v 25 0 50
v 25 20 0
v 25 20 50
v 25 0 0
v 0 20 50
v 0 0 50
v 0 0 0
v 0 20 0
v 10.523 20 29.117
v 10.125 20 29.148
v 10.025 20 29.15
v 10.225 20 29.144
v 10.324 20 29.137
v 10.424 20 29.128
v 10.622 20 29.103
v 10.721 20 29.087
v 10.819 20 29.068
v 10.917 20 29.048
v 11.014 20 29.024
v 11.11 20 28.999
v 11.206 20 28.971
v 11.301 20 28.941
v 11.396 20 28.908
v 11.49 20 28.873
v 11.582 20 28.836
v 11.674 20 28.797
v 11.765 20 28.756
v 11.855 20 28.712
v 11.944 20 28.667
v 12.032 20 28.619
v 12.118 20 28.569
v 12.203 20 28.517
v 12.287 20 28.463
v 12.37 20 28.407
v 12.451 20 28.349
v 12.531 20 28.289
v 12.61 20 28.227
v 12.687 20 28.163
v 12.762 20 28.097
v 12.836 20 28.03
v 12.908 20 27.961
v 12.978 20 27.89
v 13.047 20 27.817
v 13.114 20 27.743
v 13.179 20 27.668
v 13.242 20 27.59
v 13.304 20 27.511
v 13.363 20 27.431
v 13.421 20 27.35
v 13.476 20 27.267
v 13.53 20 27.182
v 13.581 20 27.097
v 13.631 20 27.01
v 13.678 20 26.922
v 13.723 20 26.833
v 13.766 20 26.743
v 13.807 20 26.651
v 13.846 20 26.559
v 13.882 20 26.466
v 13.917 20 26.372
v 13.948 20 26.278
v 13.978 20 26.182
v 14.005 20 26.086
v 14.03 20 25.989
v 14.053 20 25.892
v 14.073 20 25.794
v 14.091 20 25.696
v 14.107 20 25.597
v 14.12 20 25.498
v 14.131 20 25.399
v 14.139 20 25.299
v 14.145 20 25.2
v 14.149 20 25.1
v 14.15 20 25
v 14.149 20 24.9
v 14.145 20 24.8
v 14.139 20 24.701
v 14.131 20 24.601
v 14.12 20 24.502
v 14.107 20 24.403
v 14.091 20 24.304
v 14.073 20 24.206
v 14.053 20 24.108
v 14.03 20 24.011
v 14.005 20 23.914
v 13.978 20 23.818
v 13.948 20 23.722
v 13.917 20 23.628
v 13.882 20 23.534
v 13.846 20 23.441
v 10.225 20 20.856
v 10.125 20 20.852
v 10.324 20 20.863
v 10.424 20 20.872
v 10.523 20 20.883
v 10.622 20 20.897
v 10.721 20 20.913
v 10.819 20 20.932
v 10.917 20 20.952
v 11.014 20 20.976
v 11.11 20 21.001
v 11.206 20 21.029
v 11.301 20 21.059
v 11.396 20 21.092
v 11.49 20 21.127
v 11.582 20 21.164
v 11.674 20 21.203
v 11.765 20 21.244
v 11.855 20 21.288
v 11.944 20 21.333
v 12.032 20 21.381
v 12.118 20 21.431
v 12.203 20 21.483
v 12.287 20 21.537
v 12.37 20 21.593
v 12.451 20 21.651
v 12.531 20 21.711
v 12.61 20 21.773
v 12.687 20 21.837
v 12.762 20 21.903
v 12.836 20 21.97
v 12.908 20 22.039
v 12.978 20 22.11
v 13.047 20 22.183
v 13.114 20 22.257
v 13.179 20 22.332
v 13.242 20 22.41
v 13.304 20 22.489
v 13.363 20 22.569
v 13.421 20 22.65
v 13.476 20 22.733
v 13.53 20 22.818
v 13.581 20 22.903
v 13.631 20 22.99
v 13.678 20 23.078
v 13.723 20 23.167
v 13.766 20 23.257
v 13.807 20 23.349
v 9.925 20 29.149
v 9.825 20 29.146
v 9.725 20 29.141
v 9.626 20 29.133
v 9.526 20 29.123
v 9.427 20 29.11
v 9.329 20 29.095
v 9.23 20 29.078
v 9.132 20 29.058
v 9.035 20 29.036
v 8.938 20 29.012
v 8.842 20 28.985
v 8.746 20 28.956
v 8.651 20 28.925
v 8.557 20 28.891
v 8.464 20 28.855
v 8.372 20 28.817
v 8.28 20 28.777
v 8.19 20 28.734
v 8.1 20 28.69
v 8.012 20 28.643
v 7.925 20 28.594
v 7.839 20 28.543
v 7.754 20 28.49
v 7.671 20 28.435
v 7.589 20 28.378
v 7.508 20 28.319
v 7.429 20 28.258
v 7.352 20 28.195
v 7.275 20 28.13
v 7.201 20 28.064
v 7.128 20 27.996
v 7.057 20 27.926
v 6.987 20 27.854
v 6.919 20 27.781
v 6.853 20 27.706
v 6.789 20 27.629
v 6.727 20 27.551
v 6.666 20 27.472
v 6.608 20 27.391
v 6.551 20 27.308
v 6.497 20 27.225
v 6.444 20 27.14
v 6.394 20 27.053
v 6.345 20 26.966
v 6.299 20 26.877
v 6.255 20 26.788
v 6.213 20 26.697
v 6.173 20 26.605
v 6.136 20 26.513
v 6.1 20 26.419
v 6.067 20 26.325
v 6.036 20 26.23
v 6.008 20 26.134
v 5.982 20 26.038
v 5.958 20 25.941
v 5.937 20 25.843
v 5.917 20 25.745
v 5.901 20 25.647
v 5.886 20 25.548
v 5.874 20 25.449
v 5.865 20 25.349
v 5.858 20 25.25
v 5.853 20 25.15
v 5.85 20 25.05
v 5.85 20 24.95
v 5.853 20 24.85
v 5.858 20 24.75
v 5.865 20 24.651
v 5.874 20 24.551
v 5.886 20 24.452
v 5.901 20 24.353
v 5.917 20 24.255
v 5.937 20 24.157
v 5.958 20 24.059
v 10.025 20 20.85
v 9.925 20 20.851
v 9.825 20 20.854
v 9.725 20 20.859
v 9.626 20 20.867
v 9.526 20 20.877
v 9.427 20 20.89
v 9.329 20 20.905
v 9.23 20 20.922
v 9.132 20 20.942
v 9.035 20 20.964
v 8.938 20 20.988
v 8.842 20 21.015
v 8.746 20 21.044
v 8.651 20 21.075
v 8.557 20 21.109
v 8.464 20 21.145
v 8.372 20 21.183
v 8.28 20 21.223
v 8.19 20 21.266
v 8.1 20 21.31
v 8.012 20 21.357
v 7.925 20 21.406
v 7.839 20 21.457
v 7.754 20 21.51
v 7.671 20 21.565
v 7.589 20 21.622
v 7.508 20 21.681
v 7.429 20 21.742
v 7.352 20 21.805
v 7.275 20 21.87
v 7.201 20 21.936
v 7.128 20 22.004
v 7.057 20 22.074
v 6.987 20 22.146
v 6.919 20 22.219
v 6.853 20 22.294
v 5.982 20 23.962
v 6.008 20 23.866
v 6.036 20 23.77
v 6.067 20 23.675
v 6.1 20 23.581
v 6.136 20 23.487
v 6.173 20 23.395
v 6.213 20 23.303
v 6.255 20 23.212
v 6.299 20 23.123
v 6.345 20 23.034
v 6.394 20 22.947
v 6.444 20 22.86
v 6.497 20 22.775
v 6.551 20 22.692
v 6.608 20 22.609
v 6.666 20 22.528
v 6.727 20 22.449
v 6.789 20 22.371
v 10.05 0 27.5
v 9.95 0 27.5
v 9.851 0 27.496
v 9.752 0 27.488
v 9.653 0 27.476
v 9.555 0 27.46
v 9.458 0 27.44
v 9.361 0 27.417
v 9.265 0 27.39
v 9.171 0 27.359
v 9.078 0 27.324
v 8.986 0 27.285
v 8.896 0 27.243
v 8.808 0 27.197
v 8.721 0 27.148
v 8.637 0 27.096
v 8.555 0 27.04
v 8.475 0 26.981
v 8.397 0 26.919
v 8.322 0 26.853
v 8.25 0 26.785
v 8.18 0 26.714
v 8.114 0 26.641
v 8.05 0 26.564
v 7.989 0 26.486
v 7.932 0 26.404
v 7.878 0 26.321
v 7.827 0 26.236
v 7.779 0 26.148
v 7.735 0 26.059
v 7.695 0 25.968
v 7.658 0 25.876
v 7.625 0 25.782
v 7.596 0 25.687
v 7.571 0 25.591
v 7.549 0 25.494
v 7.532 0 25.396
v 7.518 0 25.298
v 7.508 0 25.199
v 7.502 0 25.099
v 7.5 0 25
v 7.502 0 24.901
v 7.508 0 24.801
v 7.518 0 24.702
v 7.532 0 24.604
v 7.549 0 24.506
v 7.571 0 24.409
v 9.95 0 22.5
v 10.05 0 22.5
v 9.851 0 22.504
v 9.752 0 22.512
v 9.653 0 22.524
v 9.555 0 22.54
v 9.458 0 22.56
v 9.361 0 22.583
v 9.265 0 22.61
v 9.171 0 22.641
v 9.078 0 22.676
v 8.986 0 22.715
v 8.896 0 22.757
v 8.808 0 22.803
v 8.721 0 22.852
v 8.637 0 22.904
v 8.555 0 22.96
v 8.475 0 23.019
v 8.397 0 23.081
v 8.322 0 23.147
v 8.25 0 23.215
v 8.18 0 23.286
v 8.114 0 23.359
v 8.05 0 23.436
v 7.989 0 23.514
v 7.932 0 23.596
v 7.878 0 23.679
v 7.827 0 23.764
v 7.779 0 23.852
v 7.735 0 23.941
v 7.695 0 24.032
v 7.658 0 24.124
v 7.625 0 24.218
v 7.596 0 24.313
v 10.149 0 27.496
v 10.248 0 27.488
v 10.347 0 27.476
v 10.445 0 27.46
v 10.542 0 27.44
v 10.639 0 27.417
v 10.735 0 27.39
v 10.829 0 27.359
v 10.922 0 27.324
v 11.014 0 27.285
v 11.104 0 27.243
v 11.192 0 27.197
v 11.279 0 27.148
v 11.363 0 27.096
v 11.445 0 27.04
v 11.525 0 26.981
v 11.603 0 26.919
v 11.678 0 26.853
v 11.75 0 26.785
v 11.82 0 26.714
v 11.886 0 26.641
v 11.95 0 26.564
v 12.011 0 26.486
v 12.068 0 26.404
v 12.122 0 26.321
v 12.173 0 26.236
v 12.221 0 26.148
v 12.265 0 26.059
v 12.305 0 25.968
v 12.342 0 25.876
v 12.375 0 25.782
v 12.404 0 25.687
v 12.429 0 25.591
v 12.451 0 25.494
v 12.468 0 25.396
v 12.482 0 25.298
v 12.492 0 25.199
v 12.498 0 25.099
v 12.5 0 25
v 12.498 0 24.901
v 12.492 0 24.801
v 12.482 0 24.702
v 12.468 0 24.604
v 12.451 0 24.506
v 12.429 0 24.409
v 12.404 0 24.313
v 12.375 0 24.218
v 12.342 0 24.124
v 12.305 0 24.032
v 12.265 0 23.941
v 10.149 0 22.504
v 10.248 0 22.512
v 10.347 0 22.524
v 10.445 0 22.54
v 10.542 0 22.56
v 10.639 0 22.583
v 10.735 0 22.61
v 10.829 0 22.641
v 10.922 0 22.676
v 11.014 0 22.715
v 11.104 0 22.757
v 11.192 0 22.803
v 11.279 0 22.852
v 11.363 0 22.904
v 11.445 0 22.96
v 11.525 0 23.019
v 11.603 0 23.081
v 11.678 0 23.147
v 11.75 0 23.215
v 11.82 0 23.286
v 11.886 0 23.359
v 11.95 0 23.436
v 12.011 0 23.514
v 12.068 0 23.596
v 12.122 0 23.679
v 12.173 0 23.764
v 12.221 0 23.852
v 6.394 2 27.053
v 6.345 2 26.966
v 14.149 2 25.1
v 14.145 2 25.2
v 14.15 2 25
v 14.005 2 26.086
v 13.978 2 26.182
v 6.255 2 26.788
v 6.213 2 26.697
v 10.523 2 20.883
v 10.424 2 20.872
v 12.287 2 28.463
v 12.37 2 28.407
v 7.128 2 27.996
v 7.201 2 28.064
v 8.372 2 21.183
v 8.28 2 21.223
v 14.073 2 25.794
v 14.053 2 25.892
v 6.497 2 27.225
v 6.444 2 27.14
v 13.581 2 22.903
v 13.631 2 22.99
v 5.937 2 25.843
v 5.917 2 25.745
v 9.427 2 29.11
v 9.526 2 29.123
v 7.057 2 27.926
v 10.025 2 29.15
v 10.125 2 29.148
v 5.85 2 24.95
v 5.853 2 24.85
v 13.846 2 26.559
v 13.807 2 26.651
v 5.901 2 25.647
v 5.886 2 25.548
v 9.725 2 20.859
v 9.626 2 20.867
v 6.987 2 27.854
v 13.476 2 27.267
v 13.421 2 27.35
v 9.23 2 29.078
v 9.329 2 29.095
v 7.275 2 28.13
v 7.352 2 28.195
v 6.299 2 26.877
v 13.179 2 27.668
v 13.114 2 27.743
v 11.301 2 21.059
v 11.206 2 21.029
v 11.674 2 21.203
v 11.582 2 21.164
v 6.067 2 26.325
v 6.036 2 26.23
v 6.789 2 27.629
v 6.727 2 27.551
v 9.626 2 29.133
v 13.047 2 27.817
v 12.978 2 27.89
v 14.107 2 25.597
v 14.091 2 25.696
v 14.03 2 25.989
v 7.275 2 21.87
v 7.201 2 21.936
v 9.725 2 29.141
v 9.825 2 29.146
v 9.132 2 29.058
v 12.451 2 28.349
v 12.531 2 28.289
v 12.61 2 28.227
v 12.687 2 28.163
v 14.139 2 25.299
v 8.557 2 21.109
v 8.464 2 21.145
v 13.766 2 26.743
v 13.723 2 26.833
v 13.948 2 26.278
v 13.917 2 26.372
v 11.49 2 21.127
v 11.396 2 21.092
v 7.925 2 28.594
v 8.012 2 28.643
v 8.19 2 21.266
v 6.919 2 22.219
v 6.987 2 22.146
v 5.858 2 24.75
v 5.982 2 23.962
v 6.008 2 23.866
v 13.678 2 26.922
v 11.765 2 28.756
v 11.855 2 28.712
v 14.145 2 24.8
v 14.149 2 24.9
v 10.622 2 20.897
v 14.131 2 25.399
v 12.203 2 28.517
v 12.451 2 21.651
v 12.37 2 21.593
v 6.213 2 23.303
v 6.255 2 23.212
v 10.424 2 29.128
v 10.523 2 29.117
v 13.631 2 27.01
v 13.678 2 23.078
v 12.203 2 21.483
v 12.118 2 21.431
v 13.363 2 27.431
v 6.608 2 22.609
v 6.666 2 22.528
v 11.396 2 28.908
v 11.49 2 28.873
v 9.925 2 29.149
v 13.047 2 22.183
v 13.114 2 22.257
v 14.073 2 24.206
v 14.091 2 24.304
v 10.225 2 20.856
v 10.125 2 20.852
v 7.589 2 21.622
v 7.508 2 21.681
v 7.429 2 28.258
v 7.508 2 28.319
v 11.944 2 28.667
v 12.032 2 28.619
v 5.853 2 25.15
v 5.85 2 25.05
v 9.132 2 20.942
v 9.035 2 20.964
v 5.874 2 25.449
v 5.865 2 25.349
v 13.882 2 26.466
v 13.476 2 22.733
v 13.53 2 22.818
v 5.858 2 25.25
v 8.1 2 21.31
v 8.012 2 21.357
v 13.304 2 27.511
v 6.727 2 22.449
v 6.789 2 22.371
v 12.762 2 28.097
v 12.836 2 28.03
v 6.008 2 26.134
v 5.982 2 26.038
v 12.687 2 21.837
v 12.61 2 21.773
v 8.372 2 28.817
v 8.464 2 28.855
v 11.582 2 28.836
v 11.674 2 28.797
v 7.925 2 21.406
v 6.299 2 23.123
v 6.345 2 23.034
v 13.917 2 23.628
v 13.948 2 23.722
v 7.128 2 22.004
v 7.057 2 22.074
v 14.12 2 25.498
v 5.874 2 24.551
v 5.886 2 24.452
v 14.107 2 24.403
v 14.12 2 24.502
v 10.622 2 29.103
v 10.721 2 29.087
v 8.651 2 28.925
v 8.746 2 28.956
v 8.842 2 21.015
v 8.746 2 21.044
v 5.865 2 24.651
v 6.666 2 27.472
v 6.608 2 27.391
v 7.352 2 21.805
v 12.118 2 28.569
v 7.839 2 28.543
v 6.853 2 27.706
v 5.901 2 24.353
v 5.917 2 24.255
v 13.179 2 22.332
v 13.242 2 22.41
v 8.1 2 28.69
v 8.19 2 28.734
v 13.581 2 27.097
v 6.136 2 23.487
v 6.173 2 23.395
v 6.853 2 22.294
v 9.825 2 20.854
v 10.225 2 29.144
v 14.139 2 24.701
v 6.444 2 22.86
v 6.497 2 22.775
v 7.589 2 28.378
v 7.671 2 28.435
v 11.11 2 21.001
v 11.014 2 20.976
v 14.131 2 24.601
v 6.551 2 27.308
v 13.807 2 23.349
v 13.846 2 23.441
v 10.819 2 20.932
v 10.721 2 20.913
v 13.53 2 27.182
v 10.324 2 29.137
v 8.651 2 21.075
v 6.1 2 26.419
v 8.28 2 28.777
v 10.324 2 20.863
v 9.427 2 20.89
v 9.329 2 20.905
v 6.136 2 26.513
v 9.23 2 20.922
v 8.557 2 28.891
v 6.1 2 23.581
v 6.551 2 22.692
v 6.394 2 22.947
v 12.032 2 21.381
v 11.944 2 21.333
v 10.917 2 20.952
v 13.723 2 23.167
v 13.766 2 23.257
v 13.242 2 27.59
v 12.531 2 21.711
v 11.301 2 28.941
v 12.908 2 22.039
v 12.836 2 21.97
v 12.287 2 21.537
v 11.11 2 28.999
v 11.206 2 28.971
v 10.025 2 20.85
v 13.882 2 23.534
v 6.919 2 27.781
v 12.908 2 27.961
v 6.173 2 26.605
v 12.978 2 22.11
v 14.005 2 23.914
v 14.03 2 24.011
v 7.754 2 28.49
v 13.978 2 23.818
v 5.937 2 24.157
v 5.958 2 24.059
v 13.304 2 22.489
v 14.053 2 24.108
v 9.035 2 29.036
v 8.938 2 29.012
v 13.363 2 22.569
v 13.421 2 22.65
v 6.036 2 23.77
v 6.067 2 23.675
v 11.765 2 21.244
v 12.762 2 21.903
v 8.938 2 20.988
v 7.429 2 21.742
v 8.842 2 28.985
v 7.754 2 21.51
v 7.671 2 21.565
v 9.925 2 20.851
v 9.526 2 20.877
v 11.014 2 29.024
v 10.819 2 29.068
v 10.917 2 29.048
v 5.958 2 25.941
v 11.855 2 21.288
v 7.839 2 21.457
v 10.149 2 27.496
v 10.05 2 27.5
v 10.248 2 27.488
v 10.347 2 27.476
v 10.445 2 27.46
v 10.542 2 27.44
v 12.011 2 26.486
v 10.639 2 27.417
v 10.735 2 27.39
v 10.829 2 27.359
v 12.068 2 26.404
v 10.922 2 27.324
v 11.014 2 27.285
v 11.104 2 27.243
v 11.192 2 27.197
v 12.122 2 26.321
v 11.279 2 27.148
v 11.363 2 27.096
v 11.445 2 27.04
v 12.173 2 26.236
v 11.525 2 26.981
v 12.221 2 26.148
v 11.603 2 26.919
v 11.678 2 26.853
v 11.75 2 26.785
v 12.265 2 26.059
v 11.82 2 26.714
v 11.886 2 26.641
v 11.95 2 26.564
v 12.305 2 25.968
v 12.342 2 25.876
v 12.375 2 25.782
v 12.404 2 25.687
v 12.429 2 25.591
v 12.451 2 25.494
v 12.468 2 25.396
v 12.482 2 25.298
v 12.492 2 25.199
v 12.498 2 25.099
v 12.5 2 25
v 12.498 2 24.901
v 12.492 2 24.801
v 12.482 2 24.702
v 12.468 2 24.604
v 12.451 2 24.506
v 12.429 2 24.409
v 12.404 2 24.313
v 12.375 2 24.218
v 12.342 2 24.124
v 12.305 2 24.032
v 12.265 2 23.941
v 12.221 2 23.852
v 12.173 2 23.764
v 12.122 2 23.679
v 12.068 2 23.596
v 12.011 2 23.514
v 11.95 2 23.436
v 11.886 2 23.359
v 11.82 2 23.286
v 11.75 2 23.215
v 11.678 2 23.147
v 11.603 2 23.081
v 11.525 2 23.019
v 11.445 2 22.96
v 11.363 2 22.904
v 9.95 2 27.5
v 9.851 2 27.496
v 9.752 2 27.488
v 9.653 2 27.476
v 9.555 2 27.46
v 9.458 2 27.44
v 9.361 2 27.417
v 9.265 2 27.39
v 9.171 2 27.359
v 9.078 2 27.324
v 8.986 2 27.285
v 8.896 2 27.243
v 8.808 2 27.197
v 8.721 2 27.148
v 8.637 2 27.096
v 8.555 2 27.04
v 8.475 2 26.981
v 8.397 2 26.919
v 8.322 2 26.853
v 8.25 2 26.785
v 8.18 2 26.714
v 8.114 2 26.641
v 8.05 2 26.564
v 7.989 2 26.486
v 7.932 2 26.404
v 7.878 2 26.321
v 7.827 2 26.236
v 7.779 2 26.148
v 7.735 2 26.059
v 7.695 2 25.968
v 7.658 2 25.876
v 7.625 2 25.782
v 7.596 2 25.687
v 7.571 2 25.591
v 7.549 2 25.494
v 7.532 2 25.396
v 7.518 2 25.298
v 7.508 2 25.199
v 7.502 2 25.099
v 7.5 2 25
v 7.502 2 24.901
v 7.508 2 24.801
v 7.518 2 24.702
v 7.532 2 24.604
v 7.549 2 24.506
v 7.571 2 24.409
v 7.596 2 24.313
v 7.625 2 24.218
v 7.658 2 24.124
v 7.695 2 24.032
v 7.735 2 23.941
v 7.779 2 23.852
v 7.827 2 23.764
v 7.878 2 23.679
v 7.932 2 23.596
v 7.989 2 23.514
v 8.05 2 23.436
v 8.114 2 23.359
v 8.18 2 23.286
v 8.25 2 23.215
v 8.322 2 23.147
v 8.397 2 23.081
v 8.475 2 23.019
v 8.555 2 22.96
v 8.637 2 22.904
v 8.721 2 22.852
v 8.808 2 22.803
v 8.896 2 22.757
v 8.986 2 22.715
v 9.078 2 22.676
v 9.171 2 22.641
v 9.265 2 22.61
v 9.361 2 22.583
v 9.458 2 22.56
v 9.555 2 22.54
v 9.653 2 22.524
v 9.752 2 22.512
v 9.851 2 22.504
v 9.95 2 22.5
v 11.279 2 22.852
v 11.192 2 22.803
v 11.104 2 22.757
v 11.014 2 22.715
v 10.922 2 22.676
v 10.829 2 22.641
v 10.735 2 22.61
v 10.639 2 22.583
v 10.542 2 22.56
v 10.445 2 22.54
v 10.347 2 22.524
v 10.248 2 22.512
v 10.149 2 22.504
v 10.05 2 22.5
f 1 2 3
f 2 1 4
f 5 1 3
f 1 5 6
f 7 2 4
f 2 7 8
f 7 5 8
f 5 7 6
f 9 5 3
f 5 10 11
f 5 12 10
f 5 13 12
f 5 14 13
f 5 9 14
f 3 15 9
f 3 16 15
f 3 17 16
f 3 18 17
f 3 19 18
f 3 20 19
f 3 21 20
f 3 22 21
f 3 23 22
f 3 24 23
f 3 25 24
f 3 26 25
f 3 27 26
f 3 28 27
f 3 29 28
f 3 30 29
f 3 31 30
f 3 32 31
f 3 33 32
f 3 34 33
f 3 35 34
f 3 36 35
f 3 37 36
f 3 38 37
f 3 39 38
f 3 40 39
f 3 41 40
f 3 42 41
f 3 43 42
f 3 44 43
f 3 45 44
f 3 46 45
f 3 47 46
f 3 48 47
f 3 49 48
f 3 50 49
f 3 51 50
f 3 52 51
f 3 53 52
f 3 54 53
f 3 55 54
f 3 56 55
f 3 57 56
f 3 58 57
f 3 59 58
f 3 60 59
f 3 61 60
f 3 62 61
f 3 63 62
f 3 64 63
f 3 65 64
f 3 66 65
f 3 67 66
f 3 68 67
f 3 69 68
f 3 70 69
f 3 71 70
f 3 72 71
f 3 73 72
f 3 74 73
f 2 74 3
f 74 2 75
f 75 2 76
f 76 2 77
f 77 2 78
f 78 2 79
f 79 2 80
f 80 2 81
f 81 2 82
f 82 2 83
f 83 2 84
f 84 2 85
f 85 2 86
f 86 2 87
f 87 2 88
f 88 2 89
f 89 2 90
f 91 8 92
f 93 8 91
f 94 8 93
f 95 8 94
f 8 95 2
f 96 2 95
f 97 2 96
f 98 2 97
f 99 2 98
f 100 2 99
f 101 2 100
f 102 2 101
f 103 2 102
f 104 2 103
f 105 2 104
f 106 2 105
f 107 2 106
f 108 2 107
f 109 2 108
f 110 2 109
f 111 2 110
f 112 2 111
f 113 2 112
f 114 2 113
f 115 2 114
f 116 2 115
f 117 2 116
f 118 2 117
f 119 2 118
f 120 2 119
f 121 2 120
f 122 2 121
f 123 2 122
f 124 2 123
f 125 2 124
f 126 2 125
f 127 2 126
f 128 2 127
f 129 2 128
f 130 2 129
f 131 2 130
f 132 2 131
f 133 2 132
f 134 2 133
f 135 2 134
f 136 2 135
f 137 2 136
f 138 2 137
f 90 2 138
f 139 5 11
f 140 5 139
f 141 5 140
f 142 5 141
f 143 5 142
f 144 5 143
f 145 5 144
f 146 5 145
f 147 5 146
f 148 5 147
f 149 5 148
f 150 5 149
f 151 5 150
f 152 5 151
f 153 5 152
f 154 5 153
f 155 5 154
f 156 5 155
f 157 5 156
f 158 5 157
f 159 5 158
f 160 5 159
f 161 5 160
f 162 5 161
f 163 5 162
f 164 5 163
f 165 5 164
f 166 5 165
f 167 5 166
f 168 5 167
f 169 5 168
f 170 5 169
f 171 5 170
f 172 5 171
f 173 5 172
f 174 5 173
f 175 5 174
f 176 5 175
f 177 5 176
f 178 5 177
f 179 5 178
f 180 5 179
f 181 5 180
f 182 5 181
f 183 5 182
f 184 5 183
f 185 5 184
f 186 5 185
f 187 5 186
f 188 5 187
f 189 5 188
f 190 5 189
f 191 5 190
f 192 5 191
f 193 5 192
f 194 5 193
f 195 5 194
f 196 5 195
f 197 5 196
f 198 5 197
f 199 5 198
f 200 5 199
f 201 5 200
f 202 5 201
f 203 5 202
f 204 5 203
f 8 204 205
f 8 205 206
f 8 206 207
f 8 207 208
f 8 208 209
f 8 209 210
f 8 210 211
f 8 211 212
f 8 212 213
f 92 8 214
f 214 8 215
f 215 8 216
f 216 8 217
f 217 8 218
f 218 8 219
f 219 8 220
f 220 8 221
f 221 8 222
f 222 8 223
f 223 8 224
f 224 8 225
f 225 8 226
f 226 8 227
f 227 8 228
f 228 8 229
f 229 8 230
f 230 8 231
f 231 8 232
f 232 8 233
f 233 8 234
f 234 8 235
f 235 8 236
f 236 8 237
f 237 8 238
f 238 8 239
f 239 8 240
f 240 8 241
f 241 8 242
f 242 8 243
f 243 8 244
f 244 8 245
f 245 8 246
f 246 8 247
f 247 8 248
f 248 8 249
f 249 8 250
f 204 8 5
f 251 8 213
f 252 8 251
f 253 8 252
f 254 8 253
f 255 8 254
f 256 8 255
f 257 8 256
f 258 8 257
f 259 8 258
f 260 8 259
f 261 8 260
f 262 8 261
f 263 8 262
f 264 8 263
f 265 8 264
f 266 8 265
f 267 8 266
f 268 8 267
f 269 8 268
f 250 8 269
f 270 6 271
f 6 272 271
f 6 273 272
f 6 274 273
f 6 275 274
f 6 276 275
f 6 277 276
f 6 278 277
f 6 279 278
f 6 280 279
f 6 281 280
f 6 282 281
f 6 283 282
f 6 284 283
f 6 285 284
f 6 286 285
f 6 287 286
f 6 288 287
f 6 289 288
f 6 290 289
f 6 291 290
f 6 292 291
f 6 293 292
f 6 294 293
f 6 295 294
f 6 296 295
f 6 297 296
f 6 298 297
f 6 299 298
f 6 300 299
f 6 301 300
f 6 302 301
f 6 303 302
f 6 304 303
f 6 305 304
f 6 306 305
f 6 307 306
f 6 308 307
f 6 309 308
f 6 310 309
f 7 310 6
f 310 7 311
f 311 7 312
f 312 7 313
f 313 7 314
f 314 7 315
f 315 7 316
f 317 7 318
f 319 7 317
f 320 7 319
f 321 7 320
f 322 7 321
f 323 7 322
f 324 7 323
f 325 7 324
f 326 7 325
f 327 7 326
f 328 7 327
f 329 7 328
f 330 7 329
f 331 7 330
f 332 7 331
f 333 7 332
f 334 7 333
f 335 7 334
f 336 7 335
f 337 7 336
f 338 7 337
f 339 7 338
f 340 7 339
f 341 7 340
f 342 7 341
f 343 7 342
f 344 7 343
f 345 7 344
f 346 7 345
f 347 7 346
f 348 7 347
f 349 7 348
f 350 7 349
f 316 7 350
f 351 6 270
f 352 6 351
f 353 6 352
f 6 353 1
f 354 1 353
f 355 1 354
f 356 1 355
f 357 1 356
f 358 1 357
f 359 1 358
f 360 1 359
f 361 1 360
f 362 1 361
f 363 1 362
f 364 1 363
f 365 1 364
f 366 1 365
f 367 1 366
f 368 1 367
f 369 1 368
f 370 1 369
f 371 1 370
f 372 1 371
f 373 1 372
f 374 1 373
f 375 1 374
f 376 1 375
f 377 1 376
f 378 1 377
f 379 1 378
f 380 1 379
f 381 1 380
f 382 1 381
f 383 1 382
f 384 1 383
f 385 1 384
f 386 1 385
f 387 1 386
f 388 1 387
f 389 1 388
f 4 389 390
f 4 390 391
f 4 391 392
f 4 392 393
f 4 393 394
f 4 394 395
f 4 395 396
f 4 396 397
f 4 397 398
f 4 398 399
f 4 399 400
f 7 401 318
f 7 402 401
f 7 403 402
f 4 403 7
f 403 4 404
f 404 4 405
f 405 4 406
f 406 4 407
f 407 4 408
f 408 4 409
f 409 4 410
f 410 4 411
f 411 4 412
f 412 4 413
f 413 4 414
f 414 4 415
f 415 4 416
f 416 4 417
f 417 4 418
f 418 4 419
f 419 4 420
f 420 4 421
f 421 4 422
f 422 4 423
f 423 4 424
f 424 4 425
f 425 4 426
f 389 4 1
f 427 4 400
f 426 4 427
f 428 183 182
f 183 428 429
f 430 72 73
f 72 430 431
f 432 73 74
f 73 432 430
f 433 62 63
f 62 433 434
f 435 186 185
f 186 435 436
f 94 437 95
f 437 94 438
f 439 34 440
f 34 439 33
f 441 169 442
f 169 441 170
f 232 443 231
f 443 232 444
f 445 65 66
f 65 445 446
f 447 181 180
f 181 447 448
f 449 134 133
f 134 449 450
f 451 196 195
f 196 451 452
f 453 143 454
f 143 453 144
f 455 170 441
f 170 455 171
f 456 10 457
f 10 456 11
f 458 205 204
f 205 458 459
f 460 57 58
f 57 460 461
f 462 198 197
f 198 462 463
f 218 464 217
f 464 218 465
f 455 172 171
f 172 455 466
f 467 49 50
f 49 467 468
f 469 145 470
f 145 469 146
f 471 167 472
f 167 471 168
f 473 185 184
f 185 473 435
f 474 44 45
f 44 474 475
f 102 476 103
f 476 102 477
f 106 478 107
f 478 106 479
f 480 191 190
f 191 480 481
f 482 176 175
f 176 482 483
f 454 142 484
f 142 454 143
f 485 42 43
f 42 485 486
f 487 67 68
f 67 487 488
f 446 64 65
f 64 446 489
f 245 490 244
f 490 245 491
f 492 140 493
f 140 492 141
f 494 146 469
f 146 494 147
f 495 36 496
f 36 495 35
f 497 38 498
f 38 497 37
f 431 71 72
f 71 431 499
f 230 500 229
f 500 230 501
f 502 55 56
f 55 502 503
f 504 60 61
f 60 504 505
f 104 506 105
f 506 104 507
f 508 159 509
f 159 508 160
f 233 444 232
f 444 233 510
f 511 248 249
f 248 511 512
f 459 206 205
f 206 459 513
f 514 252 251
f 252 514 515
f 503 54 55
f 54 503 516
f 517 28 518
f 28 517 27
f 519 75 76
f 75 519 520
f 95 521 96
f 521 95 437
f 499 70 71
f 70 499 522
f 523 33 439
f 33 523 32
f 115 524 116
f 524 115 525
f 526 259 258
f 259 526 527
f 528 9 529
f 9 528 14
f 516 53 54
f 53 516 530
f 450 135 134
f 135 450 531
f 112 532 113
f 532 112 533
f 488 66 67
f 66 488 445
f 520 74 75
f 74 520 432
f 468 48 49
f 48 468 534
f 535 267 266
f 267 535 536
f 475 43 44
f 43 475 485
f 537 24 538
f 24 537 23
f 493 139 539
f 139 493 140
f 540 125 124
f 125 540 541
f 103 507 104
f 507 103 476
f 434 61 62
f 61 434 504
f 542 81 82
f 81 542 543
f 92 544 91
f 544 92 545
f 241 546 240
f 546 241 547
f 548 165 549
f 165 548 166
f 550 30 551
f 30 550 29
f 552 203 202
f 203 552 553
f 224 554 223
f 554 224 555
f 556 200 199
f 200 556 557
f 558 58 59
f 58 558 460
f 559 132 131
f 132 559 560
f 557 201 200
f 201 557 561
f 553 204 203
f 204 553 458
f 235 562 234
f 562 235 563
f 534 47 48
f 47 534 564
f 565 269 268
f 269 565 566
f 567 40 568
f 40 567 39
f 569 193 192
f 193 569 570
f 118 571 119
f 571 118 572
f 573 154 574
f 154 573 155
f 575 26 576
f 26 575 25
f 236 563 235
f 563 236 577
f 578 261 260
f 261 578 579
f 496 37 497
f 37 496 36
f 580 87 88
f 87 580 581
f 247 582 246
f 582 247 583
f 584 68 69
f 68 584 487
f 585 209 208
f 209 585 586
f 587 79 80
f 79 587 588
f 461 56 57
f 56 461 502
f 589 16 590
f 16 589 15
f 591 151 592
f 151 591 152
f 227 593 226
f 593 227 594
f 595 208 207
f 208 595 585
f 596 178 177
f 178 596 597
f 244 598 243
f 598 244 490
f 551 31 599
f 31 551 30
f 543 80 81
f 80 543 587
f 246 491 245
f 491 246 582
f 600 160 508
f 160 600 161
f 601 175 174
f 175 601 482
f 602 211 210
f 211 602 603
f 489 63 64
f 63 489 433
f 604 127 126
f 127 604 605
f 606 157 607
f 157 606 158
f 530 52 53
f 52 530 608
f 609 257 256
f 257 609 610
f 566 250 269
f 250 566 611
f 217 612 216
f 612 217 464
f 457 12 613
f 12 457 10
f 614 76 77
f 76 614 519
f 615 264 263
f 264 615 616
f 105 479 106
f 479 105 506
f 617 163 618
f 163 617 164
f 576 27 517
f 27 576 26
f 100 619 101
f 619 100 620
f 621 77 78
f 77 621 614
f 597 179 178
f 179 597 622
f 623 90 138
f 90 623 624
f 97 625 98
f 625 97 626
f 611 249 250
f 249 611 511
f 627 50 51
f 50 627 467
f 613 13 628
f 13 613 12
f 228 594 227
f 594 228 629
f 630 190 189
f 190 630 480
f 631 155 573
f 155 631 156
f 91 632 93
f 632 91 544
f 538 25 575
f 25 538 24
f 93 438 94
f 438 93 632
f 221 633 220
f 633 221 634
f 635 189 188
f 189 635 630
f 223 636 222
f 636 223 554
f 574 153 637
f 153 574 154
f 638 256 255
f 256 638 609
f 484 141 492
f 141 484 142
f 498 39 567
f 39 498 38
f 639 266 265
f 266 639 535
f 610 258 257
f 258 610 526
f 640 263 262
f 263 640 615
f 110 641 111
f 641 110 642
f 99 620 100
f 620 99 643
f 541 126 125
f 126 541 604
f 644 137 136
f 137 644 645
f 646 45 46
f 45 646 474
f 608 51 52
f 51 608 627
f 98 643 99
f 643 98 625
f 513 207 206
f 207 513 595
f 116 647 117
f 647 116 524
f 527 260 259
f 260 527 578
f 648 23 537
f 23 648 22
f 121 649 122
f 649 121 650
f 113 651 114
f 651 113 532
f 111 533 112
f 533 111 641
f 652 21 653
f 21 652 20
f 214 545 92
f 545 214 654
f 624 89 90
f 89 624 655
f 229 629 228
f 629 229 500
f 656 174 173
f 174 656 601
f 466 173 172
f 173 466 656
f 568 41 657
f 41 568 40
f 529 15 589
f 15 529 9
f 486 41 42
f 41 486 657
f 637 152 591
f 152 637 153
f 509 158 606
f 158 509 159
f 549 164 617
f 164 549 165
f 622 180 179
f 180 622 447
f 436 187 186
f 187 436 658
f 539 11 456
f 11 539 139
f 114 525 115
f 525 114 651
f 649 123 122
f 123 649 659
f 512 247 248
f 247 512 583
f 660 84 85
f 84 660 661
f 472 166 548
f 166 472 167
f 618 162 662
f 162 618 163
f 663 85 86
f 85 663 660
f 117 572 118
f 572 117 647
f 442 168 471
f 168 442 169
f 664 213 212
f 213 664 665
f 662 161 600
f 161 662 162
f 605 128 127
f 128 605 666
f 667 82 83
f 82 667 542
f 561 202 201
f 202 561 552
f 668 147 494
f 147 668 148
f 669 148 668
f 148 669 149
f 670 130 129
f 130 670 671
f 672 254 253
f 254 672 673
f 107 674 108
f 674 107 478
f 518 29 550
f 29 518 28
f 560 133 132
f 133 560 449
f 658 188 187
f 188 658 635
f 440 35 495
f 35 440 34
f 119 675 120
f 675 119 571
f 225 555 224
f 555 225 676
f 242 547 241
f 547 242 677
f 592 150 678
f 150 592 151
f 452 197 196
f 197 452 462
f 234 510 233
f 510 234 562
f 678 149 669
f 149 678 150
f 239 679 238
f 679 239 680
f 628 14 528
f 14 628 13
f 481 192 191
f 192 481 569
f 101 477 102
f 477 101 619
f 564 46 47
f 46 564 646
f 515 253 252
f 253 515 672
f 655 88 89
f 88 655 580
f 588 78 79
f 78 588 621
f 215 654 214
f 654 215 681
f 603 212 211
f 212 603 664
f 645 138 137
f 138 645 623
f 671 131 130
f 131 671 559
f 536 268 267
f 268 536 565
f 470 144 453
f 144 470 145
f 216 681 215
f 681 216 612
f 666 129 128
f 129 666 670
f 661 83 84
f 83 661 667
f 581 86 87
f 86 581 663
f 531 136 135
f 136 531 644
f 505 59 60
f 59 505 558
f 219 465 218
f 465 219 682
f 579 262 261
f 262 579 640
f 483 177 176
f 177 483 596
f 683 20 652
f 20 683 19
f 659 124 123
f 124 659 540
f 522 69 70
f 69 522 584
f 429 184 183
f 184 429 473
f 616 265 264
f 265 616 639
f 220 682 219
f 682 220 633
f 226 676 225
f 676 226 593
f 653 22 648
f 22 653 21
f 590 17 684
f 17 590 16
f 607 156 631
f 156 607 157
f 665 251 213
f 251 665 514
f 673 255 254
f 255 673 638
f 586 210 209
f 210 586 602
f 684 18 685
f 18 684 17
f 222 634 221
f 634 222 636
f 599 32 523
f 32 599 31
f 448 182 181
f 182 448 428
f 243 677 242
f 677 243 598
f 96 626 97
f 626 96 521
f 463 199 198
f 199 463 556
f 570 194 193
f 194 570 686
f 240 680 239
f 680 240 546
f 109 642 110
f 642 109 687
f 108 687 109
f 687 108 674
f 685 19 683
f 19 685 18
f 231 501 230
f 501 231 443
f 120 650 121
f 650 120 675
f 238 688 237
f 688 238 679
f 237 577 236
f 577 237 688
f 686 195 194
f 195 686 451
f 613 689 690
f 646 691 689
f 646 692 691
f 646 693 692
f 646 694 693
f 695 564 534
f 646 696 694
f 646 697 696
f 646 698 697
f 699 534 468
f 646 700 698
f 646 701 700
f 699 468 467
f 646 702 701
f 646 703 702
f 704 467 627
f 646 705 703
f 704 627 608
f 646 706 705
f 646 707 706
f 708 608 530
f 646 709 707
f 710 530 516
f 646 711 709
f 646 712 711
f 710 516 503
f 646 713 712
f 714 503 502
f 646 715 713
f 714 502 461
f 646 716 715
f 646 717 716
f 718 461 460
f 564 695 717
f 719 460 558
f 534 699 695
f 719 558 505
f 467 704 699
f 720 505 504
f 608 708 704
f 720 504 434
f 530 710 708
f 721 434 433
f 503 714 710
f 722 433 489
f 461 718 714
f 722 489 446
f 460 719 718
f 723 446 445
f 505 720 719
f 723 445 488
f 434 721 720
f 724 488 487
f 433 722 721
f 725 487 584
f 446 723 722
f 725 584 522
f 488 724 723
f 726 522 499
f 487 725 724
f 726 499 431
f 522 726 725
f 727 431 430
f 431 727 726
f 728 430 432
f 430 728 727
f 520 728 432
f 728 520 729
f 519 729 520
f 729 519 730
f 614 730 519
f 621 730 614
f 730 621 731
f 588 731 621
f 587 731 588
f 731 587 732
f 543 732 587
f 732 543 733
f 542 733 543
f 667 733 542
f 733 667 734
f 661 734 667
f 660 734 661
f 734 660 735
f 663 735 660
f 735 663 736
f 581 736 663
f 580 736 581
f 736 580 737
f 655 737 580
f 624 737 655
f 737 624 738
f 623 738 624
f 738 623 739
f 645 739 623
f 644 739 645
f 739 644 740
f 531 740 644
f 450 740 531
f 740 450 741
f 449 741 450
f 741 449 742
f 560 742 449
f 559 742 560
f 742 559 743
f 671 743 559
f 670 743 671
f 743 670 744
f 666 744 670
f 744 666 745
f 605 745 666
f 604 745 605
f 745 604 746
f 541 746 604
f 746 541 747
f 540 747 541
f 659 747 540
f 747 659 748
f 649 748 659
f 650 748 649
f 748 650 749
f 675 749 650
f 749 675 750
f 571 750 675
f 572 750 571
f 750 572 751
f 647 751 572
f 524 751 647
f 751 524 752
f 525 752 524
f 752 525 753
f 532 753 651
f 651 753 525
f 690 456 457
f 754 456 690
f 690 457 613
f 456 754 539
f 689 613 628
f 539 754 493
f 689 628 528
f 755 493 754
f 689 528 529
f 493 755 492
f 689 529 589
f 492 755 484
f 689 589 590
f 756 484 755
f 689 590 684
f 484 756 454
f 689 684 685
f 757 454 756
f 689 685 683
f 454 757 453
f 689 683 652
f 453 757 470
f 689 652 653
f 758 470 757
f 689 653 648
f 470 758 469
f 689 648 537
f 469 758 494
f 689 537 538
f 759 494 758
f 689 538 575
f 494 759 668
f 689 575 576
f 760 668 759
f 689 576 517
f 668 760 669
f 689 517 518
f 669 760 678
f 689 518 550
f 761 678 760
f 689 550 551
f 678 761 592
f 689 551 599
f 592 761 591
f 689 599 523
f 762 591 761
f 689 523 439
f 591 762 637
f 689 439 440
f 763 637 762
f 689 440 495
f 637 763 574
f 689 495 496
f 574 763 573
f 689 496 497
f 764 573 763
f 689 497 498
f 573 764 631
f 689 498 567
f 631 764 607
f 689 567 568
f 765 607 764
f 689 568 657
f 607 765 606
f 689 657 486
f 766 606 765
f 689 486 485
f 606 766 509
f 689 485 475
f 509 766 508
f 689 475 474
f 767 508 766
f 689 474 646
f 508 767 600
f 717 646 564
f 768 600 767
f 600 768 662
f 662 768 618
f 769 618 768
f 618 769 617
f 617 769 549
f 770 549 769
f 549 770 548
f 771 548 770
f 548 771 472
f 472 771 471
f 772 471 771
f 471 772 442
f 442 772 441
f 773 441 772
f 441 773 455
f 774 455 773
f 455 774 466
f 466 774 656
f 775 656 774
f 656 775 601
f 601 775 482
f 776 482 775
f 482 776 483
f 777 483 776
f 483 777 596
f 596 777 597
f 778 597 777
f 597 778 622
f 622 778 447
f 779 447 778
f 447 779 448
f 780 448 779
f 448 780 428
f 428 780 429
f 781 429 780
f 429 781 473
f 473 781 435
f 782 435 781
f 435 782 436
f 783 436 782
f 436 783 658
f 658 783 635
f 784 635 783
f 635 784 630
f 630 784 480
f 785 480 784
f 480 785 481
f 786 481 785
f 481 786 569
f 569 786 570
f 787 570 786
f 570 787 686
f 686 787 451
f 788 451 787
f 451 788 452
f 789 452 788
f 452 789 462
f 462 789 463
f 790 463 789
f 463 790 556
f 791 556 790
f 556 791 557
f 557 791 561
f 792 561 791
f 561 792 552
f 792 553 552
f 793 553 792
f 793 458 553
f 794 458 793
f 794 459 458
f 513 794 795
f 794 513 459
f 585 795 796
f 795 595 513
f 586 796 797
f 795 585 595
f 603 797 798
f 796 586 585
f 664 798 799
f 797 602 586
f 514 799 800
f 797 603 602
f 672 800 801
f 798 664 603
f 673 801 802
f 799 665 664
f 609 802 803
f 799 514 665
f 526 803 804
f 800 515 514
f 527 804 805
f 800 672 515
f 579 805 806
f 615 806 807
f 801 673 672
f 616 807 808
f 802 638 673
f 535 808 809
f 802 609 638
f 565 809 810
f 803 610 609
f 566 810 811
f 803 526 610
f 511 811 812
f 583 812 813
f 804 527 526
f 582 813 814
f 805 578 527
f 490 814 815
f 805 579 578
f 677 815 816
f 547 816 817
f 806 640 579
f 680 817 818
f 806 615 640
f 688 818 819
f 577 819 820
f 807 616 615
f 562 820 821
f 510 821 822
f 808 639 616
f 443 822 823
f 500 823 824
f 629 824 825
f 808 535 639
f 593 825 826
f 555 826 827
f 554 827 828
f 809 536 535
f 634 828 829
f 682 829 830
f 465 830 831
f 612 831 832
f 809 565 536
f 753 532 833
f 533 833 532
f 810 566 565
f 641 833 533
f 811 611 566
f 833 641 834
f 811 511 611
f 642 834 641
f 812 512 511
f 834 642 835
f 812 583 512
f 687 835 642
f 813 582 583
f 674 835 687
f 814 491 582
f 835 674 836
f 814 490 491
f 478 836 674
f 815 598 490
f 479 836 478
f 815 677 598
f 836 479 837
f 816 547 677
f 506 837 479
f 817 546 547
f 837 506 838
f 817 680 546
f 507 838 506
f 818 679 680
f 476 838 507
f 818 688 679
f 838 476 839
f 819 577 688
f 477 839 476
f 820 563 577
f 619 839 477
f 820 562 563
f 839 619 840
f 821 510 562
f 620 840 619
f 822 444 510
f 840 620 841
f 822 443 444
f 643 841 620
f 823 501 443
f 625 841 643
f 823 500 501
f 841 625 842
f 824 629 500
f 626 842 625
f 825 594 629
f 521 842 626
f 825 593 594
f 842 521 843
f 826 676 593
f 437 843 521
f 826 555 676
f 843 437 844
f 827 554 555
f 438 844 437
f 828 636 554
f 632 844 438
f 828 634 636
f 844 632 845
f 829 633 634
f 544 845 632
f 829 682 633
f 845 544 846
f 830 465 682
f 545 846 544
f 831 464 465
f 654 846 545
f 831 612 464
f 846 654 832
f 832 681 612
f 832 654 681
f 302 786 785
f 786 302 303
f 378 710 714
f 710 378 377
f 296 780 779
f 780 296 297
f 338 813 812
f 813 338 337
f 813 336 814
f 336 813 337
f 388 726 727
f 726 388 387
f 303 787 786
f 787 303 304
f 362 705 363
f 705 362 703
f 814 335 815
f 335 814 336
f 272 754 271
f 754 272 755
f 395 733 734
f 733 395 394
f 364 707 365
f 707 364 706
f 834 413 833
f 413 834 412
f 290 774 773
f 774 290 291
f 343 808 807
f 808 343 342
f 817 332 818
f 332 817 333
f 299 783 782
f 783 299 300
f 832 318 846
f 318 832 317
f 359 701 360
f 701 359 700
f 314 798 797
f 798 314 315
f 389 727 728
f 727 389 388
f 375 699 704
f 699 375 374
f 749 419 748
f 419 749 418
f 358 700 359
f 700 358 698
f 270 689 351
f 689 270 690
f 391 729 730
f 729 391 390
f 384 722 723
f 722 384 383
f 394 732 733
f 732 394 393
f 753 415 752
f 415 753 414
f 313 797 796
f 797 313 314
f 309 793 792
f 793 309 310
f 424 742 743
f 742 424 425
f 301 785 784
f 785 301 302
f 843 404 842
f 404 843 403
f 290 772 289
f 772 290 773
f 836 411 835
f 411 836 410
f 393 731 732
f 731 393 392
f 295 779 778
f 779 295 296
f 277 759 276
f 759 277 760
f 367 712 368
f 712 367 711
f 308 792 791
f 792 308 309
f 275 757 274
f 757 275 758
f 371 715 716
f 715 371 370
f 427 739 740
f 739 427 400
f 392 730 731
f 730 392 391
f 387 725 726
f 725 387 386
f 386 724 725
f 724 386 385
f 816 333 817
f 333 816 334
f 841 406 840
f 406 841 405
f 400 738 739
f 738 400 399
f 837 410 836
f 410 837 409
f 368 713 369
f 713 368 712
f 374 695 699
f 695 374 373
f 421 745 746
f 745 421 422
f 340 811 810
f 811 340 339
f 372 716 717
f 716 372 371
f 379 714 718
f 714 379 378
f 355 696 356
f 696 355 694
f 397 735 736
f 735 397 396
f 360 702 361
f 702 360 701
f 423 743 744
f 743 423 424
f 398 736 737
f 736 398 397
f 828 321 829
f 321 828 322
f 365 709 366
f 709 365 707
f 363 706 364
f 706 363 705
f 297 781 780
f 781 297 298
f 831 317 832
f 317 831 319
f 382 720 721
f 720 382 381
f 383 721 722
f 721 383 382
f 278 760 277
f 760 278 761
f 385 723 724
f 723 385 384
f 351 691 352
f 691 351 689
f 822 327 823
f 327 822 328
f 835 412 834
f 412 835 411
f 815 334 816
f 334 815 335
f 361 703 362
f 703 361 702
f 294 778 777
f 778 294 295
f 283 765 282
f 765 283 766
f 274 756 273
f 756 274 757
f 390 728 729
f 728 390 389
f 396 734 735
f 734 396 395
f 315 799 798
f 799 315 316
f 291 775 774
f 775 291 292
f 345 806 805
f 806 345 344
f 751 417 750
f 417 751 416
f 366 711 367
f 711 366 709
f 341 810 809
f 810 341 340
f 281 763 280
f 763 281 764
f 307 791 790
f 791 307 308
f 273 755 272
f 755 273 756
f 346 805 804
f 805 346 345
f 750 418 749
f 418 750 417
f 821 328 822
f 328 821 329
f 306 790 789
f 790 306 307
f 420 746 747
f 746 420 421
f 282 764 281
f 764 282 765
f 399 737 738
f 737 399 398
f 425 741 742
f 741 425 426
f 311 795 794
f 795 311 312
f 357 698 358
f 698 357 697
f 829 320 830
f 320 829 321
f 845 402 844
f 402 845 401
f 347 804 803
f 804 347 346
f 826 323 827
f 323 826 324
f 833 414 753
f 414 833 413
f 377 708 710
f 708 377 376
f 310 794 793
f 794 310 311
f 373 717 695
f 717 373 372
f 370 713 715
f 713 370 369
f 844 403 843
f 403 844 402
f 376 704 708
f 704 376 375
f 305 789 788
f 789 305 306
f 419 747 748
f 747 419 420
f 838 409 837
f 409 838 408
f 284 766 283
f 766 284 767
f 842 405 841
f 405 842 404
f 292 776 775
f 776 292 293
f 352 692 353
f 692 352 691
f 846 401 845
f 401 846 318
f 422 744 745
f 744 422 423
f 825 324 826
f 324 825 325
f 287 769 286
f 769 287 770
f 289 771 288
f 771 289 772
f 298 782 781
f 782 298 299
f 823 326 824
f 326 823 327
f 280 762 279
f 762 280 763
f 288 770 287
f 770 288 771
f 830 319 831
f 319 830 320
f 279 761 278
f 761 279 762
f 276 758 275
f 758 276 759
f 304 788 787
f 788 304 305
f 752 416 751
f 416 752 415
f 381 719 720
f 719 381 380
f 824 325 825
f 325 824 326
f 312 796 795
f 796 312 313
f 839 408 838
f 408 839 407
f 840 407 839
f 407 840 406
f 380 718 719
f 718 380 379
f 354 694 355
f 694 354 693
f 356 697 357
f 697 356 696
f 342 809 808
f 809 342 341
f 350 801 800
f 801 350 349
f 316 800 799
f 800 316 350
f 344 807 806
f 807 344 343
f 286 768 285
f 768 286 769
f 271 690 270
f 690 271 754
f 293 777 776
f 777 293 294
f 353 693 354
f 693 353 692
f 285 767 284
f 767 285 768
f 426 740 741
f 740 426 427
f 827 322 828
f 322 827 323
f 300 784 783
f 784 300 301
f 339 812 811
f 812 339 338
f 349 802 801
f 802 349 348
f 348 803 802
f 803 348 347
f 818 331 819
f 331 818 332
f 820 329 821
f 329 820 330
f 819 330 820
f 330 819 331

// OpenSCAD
/**
 * y-rod-mount.scad
 *
 * Y-axis carriage rod end-capture block: 25 x 20 x 50 mm with a rod bore.
 * Bore centre: X = _yrm_bore_x = 10 (10 mm from the outer face); Z driven by y_rod_z.
 * Block is 25 mm wide — 5 mm of extra material on the center-facing side vs. the rod.
 * Right-side corners are placed with mirror([1,0,0]) at the call site; see upper-top-frame.scad.
 *
 * Two variants:
 *   y_rod_mount_front() — rod bore enters from the Y=_yrm_d face (interior face).
 *   y_rod_mount_rear()  — rod bore enters from the Y=0 face + stacked pulley pockets.
 *                         Pulley pocket opens through X+ and Y- faces (printer interior).
 *
 * Pulley stack geometry (rear variant):
 *   Two 18 mm OD × 8.5 mm pulleys on an M5 axle bolt (inserted from bottom).
 *   Rod bottom-face → top belt gap is 8 mm; belt-to-belt gap is 4 mm; each belt 6 mm.
 *   Lower pulley bottom ≈ 7.0 mm, upper pulley top ≈ 25.5 mm.
 *
 * Shaft bore position (rear, X=17, Y=5):
 *   Rod bore axis at X=10.  Sum of bore radii = 6.8 mm; X=17 gives 7 mm clearance.
 *   Shaft bore stops 2 mm below rod bore floor — no Z overlap.
 *   Y=5 leaves 6 mm wall to the rear-extrusion face at Y=20.
 *   Wall from shaft bore edge to center-facing face: 25 - (17 + 2.65) = 5.35 mm.
 *
 * See upper-top-frame.scad for placement.
 */

include <shared-dims.scad>

// ---------------------------------------------------------------------------
// Block envelope
// ---------------------------------------------------------------------------
_yrm_w          = 25.0;   // 5 mm extra on center-facing side (was 20)
_yrm_d          = 20.0;
_yrm_h          = 50.0;

// ---------------------------------------------------------------------------
// Rod bore
// ---------------------------------------------------------------------------
_yrm_bore_x     = 10.0;                      // bore centre X — 10 mm from outer face
_yrm_bore_dia   = carriage_rod_dia + 0.3;    // 8.3 mm — 8 mm rod + 0.3 slip fit
_yrm_bore_depth = _yrm_d - 2;                // 18 mm — rod bottoms out 2 mm from far face
_yrm_air_dia    = 5.0;                        // air-escape through-hole diameter
_yrm_bore_z     = y_rod_z - utf_post_bot_z;  // 36.275 mm — rod centre, local to block

// ---------------------------------------------------------------------------
// Rear-variant idler pulley geometry
// ---------------------------------------------------------------------------
_pul_od         = 18.0;
_pul_h          = 8.5;
_pul_belt_w     = 6.0;

_belt_rod_gap   = 8.0;    // rod bottom face → top belt top face
_belt_belt_gap  = 4.0;    // top belt bottom face → bottom belt top face

_top_belt_top_z = _yrm_bore_z - carriage_rod_dia / 2 - _belt_rod_gap;
_top_belt_cz    = _top_belt_top_z - _pul_belt_w / 2;
_bot_belt_top_z = _top_belt_top_z - _pul_belt_w - _belt_belt_gap;
_bot_belt_cz    = _bot_belt_top_z - _pul_belt_w / 2;

_pul_bot_z      = _bot_belt_cz - _pul_h / 2;   // ≈ 7.0 mm — lower pulley bottom
_pul_top_z      = _top_belt_cz + _pul_h / 2;   // ≈ 25.5 mm — upper pulley top

_pul_r          = _pul_od / 2 + 0.6;            // 9.6 mm — pocket radius with clearance
_pul_pckt_bot   = _pul_bot_z - 0.5;
_pul_pckt_top   = _pul_top_z + 0.5;

_shaft_x        = 17.0;
_shaft_y        = 5.0;
_shaft_dia      = 5.3;
_shaft_top_z    = _yrm_bore_z - _yrm_bore_dia / 2 - 2.0;

_m5_head_dia    = 9.5;
_m5_head_depth  = 4.0;
_m5_nut_dia     = 9.2;
_m5_nut_h       = 5.0;

// ---------------------------------------------------------------------------
// Front variant — bore enters from Y=_yrm_d (interior face); right side uses mirror([1,0,0])
// ---------------------------------------------------------------------------
module y_rod_mount_front() {
    difference() {
        cube([_yrm_w, _yrm_d, _yrm_h]);
        // Rod bore: enters from the Y=_yrm_d face, bottoms out 2 mm from exterior face
        translate([_yrm_bore_x, _yrm_d + 0.1, _yrm_bore_z])
            rotate([90, 0, 0])
                cylinder(d = _yrm_bore_dia, h = _yrm_bore_depth + 0.1);
        // Air escape: through hole exits exterior face
        translate([_yrm_bore_x, _yrm_d + 0.1, _yrm_bore_z])
            rotate([90, 0, 0])
                cylinder(d = _yrm_air_dia, h = _yrm_d + 0.2);
    }
}

// ---------------------------------------------------------------------------
// Rear variant — bore from Y=0 (interior face) + stacked pulley pockets; right side uses mirror([1,0,0])
// ---------------------------------------------------------------------------
module y_rod_mount_rear() {
    difference() {
        cube([_yrm_w, _yrm_d, _yrm_h]);
        // Rod bore: enters from the Y=0 face
        translate([_yrm_bore_x, -0.1, _yrm_bore_z])
            rotate([-90, 0, 0])
                cylinder(d = _yrm_bore_dia, h = _yrm_bore_depth + 0.1);
        // Air escape
        translate([_yrm_bore_x, -0.1, _yrm_bore_z])
            rotate([-90, 0, 0])
                cylinder(d = _yrm_air_dia, h = _yrm_d + 0.2);
        // Pulley pocket: opens through X+ and Y- faces into printer interior
        translate([_shaft_x, _shaft_y, _pul_pckt_bot])
            cylinder(r = _pul_r, h = _pul_pckt_top - _pul_pckt_bot);
        // Shaft bore: bottom of block to just below rod bore floor
        translate([_shaft_x, _shaft_y, -0.1])
            cylinder(d = _shaft_dia, h = _shaft_top_z + 0.1);
        // M5 bolt-head counterbore at block bottom face
        translate([_shaft_x, _shaft_y, -0.1])
            cylinder(d = _m5_head_dia, h = _m5_head_depth + 0.1);
        // M5 nut seat above upper pulley
        translate([_shaft_x, _shaft_y, _pul_pckt_top])
            cylinder(d = _m5_nut_dia, h = _m5_nut_h);
    }
}

// Preview
y_rod_mount_front();
